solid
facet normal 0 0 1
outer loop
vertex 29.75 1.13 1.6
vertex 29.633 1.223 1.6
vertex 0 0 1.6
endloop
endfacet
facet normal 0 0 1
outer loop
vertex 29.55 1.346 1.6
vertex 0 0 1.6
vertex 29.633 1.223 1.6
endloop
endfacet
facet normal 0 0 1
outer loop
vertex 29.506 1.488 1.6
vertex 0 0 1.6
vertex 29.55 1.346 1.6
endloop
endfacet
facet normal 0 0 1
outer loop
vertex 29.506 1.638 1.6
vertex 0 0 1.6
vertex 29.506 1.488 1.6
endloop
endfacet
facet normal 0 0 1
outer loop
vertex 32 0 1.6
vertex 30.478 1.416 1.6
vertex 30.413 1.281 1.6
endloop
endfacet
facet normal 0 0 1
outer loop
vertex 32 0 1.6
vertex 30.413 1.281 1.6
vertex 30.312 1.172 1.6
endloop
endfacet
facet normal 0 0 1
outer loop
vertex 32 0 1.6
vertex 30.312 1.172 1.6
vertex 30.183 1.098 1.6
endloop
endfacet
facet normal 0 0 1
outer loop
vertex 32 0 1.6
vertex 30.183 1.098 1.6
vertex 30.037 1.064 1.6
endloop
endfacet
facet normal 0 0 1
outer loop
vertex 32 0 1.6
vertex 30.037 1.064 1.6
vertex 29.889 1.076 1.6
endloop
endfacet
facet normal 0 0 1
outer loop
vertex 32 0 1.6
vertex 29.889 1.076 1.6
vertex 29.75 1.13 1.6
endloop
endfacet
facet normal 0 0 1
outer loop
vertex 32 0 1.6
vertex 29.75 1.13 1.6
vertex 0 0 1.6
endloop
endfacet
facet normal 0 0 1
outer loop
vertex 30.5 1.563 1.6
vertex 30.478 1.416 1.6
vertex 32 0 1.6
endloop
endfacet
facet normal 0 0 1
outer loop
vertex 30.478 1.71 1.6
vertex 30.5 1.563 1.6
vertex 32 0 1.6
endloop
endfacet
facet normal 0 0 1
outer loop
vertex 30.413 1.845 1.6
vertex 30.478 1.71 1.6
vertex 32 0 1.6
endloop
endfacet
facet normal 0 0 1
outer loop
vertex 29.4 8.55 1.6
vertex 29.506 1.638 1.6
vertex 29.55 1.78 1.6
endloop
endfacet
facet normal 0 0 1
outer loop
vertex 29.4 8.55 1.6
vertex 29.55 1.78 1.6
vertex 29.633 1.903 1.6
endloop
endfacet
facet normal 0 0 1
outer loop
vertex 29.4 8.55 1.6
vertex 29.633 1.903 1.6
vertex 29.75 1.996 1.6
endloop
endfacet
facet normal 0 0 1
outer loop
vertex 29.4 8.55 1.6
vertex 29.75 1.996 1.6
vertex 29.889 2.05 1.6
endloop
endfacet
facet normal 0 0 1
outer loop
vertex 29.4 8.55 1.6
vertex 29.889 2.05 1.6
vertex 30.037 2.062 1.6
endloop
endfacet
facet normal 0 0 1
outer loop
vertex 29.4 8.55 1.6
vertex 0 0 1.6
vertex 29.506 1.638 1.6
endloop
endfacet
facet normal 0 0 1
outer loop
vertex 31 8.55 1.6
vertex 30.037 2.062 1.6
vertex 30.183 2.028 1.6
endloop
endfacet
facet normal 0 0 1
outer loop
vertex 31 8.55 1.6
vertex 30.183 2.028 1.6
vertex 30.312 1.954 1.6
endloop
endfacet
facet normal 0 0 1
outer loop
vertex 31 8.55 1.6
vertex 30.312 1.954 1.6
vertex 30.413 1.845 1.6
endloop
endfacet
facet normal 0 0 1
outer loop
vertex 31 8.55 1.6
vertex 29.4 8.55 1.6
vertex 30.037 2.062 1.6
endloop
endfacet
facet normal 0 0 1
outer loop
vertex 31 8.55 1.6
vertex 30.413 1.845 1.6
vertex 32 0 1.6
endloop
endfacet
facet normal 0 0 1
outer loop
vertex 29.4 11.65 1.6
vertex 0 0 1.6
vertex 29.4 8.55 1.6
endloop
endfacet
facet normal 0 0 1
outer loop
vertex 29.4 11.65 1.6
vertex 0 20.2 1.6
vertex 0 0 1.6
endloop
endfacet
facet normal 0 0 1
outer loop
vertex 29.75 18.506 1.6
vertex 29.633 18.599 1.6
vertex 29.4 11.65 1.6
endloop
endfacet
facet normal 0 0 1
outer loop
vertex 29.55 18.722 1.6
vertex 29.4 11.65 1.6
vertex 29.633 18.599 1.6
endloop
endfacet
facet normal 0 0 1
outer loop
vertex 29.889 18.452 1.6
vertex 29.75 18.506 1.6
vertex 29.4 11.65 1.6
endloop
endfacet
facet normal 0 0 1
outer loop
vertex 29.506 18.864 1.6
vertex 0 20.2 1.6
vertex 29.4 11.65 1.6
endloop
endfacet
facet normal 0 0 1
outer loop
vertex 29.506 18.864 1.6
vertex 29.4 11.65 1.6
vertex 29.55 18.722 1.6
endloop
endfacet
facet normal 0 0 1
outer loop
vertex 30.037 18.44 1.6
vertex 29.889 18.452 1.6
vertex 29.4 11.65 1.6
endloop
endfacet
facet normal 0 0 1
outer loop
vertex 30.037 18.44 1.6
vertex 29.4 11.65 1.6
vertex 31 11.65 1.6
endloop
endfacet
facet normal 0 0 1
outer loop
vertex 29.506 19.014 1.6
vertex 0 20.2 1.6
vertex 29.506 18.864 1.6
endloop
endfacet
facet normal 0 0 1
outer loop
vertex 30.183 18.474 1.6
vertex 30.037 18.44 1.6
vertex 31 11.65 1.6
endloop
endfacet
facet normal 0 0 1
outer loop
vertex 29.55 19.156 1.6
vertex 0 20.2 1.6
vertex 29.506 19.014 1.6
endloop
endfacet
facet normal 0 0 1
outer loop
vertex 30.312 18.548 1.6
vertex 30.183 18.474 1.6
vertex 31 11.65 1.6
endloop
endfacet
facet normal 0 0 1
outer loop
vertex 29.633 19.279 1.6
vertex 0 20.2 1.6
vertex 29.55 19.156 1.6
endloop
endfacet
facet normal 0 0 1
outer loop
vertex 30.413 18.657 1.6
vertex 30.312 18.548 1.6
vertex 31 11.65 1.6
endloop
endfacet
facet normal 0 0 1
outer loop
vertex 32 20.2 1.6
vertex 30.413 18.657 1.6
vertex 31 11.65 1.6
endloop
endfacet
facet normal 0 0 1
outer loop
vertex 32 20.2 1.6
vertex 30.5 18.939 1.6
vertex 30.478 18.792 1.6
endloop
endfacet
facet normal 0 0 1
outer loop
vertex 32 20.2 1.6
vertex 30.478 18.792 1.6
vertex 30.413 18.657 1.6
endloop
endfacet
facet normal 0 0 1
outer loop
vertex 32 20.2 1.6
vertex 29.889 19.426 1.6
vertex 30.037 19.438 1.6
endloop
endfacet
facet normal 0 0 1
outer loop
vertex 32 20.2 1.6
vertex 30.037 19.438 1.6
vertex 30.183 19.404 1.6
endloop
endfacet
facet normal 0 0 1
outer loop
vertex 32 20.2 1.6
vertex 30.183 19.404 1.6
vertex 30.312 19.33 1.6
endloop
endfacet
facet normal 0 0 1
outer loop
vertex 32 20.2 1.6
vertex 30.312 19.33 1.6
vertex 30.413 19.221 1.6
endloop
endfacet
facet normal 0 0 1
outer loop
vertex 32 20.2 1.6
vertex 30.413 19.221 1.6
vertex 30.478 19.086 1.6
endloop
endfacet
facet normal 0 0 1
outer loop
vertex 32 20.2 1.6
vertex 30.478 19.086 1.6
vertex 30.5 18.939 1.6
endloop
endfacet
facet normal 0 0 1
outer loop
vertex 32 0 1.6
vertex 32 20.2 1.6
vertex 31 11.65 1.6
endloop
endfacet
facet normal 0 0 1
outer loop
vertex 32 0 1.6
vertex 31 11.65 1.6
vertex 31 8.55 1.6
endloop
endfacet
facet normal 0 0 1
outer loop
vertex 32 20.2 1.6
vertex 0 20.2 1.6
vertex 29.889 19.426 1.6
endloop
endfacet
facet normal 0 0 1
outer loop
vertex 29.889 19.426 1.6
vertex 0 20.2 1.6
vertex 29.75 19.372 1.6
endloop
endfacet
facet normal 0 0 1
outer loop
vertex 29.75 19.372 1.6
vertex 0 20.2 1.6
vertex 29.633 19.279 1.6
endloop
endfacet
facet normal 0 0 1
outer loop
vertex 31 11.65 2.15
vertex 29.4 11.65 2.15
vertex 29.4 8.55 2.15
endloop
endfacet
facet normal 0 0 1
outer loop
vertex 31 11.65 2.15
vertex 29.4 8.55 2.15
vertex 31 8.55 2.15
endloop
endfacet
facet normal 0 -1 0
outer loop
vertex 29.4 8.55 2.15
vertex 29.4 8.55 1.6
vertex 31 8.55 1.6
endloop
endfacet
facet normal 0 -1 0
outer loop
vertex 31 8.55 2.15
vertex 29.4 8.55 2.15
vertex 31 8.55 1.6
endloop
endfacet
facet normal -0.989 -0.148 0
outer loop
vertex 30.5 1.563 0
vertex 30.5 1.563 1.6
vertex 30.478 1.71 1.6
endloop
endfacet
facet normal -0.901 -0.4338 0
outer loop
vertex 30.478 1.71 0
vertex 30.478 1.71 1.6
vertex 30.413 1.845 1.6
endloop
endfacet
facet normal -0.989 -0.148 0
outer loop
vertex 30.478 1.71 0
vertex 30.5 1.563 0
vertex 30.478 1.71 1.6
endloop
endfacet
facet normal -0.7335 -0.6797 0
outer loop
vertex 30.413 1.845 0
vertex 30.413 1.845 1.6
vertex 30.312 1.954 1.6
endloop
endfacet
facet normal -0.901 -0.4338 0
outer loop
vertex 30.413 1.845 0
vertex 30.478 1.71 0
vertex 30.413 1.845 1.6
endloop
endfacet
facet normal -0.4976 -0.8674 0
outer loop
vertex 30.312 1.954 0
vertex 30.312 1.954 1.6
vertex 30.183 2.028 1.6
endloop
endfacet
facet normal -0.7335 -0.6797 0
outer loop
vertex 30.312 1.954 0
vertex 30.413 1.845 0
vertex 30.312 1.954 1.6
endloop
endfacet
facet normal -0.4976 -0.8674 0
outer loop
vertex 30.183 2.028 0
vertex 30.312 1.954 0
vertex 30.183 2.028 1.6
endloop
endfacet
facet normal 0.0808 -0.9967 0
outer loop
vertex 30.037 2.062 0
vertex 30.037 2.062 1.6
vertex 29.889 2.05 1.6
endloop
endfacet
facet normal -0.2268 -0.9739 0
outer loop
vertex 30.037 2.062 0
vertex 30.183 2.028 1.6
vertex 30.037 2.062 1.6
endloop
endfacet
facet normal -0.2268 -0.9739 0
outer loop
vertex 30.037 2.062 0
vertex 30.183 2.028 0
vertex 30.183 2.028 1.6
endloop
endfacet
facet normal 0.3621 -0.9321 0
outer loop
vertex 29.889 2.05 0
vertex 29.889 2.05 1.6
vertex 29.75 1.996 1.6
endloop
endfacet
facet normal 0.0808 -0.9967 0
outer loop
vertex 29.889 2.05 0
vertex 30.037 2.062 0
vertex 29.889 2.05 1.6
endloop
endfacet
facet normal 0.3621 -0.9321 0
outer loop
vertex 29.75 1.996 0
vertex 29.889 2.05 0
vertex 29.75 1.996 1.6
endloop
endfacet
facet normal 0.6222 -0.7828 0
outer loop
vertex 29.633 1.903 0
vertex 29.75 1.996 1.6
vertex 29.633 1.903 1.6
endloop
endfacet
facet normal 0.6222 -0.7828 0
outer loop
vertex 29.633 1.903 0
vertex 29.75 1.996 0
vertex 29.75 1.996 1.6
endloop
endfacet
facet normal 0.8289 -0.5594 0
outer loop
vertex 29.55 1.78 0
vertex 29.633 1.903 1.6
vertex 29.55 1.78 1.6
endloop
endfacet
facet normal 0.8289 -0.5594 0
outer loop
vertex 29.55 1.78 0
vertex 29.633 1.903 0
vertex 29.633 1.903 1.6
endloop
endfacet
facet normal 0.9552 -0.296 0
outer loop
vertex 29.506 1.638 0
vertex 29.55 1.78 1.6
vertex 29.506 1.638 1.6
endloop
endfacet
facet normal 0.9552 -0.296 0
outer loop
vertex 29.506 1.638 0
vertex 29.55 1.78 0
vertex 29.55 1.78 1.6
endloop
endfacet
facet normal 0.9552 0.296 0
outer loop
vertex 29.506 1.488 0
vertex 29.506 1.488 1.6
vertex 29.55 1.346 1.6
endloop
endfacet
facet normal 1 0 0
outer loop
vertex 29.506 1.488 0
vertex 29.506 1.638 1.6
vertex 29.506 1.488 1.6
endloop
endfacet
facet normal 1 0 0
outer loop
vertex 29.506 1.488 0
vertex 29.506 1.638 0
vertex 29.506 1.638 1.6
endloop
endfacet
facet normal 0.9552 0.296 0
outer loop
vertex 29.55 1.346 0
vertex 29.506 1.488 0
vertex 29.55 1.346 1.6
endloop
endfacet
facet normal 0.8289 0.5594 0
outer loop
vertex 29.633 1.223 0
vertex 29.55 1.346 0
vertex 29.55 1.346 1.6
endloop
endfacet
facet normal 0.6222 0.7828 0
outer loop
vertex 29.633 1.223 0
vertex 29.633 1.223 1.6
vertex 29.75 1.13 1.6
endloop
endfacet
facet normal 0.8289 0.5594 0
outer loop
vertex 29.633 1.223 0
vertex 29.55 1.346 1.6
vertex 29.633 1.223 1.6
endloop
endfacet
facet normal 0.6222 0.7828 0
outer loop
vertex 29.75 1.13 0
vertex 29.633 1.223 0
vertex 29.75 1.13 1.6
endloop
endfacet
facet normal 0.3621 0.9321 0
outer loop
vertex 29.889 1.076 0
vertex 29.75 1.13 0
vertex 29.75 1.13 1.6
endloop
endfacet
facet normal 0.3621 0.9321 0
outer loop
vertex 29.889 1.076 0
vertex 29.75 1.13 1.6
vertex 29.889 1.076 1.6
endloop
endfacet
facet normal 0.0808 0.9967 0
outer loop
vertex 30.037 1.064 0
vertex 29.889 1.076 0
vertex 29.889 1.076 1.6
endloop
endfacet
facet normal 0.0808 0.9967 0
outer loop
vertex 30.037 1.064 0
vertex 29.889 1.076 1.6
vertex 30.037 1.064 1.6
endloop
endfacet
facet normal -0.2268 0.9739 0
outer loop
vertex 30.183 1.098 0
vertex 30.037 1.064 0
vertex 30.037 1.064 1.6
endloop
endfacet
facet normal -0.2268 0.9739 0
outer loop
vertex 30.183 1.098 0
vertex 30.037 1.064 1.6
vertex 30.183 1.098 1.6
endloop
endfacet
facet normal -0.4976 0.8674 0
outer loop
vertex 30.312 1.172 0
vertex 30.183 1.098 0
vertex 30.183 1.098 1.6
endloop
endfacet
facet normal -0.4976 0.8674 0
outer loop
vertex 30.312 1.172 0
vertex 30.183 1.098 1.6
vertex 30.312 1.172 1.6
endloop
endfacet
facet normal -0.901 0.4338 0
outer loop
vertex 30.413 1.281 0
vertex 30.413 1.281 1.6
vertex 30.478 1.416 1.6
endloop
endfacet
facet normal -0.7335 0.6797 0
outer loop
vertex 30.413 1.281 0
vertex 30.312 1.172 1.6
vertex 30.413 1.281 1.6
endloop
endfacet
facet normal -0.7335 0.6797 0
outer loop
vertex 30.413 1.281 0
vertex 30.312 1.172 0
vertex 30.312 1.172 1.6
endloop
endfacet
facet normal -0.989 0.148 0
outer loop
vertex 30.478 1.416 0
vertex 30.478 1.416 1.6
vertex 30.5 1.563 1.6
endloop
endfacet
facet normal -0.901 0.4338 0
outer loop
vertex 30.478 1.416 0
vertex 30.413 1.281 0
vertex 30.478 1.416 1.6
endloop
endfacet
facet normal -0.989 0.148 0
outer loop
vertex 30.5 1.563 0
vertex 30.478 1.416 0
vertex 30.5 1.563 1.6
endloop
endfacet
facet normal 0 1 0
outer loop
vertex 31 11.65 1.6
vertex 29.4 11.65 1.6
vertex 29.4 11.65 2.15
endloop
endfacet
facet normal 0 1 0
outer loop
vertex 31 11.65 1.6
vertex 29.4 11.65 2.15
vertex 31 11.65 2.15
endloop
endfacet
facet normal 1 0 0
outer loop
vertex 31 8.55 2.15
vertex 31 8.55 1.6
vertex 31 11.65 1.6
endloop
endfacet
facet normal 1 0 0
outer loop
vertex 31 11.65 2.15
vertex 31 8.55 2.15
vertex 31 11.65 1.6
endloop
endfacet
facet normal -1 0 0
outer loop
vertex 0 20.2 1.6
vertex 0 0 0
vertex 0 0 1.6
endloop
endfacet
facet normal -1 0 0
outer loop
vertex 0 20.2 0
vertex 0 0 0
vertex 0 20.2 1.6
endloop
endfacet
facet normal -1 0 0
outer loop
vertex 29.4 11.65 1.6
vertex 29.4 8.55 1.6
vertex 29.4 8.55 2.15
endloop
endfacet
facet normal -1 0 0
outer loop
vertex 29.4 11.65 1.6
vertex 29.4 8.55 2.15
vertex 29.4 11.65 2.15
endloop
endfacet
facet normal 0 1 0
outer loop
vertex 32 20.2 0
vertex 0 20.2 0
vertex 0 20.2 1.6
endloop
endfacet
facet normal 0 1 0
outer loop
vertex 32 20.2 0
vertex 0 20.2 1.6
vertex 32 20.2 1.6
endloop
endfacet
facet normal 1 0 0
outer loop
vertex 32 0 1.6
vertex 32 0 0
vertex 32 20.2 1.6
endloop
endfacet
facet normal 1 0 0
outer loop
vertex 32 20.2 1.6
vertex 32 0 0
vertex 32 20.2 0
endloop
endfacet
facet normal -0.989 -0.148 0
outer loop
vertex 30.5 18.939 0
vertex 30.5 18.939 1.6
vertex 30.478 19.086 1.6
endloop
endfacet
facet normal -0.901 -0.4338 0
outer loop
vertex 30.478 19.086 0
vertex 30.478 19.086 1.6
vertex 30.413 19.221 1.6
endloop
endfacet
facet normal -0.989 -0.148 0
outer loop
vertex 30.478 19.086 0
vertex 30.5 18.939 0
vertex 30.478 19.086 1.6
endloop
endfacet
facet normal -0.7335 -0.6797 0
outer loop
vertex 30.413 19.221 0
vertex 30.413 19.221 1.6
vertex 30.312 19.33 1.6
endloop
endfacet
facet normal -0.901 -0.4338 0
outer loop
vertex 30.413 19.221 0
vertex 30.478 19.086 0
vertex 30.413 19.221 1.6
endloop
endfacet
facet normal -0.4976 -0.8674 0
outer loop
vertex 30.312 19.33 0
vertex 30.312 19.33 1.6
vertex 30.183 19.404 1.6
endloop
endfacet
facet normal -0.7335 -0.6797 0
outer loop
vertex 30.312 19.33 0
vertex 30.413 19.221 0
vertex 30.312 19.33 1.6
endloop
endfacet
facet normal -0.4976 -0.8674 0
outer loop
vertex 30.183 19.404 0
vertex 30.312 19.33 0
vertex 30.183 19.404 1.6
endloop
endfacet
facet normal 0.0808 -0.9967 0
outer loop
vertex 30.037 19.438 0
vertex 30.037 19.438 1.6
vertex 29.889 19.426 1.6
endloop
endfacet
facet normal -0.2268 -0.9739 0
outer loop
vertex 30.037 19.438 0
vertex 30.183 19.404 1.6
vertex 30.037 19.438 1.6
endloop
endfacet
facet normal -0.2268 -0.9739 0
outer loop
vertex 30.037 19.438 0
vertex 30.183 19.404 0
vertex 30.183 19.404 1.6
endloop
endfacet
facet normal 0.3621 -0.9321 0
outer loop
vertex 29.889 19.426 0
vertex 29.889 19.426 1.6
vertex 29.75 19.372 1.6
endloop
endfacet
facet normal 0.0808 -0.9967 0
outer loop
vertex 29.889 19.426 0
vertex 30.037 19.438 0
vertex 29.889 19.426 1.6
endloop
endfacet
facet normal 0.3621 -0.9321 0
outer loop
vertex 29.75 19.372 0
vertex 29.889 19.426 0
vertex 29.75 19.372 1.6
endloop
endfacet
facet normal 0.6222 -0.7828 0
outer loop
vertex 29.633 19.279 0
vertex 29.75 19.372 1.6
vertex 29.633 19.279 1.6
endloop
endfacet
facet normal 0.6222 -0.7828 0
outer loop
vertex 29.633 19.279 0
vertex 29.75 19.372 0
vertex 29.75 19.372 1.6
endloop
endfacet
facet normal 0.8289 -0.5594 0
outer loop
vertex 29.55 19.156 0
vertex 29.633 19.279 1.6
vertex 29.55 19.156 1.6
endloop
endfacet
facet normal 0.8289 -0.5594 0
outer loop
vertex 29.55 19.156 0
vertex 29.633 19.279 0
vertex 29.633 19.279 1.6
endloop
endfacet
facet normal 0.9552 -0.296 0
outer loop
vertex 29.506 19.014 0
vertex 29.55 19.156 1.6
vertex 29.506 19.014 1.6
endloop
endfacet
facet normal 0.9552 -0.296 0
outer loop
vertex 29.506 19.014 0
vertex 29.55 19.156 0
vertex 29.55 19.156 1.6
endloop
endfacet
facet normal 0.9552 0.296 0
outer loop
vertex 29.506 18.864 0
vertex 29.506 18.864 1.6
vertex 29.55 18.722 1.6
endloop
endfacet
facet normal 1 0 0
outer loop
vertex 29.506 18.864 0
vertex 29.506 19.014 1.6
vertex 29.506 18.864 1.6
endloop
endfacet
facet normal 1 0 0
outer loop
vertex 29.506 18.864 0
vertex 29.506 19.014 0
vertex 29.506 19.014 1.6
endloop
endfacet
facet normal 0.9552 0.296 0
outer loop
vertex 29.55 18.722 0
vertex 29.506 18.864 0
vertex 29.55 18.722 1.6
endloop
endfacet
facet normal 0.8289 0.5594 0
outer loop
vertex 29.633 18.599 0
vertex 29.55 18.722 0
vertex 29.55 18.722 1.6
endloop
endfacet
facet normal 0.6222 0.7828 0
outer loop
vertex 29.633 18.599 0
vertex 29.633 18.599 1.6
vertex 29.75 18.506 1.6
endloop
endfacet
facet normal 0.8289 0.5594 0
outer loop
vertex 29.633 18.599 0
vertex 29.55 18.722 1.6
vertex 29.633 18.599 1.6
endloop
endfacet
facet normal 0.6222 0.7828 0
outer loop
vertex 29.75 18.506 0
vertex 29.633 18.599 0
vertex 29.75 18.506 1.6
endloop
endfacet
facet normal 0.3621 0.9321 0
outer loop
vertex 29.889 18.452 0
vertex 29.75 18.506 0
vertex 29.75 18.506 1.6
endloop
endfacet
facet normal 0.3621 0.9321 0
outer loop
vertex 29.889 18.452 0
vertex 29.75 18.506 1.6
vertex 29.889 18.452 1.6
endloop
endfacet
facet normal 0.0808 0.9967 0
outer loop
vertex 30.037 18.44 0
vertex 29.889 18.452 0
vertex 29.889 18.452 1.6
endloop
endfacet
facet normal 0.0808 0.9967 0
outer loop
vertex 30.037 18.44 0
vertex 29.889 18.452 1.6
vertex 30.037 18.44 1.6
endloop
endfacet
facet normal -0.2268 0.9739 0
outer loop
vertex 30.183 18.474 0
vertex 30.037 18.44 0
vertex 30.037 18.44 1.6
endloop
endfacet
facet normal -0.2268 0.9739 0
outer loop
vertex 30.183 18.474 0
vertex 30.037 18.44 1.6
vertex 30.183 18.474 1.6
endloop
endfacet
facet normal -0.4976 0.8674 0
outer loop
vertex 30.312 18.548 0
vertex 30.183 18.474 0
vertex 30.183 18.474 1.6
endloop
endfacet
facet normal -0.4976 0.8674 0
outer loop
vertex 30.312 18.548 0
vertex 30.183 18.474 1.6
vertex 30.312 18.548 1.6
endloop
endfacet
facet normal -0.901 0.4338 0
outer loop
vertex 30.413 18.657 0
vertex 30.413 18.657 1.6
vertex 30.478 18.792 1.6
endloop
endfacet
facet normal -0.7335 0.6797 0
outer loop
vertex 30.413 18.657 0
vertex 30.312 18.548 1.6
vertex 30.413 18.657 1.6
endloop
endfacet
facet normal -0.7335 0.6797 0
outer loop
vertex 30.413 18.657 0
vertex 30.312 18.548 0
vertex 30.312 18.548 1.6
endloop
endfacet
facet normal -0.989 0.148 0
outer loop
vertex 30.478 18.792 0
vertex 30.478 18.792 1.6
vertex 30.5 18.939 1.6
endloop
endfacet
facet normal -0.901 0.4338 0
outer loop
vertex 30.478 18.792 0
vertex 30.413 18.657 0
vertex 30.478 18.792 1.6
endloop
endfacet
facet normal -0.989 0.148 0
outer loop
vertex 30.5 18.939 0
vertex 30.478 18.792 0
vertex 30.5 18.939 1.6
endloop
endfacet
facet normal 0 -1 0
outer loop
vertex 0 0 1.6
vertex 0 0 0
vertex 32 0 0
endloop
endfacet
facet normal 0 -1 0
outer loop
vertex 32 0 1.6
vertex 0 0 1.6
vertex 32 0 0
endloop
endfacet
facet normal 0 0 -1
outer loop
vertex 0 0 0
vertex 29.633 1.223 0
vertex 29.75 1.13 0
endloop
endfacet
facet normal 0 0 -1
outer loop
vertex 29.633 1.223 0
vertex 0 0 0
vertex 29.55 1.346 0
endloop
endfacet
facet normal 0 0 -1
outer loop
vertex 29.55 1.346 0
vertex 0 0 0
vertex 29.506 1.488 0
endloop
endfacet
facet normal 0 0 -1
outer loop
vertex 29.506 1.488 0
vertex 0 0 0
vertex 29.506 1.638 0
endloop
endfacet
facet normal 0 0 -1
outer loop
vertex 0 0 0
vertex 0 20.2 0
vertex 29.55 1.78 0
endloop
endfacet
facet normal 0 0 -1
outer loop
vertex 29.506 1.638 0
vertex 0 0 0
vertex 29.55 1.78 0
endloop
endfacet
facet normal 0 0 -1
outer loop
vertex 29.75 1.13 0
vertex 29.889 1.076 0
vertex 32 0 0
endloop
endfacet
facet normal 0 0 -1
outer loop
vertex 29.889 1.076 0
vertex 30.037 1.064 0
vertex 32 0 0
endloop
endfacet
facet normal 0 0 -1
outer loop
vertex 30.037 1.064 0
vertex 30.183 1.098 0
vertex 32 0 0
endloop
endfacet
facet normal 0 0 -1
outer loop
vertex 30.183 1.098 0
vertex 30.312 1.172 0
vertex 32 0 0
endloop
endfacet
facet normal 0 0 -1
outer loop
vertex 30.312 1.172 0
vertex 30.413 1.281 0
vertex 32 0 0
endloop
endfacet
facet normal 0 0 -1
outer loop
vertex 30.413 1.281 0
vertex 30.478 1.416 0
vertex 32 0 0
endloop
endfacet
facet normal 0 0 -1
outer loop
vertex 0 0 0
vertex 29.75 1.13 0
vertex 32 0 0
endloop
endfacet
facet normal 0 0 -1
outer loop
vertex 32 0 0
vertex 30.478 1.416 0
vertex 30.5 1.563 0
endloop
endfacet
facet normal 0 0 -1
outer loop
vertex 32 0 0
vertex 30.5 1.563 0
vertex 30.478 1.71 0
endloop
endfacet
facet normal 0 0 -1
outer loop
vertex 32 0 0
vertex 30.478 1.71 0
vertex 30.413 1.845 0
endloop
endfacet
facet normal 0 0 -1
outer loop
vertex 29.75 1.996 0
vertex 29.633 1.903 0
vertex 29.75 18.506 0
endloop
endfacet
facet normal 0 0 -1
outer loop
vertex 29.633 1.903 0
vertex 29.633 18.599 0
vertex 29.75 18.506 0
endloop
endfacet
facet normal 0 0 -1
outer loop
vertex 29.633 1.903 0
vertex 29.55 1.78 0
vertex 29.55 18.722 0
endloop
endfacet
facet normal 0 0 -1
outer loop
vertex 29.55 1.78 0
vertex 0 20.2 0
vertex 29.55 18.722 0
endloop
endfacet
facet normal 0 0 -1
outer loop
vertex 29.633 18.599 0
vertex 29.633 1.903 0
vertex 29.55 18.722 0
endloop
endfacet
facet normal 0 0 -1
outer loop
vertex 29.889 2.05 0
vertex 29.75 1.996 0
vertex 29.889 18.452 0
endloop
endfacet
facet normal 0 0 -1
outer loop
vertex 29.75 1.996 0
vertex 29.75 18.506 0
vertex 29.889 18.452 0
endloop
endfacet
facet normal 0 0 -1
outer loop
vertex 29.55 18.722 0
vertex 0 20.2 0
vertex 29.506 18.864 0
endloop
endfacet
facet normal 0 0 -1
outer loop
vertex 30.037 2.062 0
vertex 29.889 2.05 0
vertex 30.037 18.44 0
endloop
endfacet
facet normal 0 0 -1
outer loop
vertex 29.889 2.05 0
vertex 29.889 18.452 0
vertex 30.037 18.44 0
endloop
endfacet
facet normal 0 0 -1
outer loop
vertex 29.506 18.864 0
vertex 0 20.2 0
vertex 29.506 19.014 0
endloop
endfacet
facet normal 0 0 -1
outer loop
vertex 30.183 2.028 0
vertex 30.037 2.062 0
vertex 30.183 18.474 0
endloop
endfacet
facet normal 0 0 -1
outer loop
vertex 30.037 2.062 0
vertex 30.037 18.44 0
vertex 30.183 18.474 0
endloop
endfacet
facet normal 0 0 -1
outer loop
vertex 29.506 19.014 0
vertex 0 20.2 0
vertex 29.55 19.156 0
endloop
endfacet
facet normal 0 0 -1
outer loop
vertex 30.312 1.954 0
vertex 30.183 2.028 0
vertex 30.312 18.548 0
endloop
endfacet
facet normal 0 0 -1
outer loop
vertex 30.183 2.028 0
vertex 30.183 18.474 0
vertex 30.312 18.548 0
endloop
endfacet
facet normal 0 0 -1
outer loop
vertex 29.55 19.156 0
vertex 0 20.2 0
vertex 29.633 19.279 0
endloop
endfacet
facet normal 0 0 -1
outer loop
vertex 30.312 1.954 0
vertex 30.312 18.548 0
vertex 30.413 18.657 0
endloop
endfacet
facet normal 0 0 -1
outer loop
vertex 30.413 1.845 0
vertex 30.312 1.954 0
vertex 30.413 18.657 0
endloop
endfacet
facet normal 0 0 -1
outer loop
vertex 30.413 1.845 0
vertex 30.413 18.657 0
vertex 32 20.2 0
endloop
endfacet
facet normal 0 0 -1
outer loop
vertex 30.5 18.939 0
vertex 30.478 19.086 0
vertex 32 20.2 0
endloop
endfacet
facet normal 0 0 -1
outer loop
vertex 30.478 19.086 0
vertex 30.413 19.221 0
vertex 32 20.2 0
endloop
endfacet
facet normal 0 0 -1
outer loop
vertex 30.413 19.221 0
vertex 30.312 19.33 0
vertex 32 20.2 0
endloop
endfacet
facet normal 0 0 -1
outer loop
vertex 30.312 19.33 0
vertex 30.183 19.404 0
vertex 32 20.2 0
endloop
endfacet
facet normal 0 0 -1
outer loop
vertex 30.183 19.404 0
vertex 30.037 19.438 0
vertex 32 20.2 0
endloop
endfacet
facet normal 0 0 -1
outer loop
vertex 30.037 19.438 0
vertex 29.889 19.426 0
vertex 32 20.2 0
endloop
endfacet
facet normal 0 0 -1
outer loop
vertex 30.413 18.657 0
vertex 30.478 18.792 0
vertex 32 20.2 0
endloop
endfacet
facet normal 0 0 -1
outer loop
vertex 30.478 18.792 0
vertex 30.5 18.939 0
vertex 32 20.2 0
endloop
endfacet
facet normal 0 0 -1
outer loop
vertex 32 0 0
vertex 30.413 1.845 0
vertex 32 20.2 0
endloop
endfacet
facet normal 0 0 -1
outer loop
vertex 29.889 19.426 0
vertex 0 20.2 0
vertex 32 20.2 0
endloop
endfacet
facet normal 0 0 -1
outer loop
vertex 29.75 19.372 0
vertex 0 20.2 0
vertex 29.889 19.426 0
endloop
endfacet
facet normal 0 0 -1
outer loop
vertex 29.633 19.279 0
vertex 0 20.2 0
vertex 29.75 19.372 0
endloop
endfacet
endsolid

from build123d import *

# Parameters (mm, degrees)
SKETCH_W     = 32
SKETCH_H     = 20.2
PAD_DEPTH    = 1.6
SKETCH003_R  = 0.5
POCKET_DEPTH = 1.601
SKETCH004_W  = 1.6
SKETCH004_H  = 3.1
PAD003_DEPTH = 2.15


with BuildPart() as part:
    # Sketch → Pad (new body)
    with BuildSketch(Plane.XY):
        with Locations((16, 10.1)):
            Rectangle(SKETCH_W, SKETCH_H)
    extrude(amount=PAD_DEPTH)

    # Sketch003 → Pocket (cut, through all)
    with BuildSketch(Plane.XY):
        with Locations((30, 18.939)):
            Circle(SKETCH003_R)
        with Locations((30, 1.563)):
            Circle(SKETCH003_R)
    extrude(amount=POCKET_DEPTH, mode=Mode.SUBTRACT)

    # Sketch004 → Pad003 (join)
    with BuildSketch(Plane.XY):
        with Locations((30.2, 10.1)):
            Rectangle(SKETCH004_W, SKETCH004_H)
    extrude(amount=PAD003_DEPTH)


solid = part.part
